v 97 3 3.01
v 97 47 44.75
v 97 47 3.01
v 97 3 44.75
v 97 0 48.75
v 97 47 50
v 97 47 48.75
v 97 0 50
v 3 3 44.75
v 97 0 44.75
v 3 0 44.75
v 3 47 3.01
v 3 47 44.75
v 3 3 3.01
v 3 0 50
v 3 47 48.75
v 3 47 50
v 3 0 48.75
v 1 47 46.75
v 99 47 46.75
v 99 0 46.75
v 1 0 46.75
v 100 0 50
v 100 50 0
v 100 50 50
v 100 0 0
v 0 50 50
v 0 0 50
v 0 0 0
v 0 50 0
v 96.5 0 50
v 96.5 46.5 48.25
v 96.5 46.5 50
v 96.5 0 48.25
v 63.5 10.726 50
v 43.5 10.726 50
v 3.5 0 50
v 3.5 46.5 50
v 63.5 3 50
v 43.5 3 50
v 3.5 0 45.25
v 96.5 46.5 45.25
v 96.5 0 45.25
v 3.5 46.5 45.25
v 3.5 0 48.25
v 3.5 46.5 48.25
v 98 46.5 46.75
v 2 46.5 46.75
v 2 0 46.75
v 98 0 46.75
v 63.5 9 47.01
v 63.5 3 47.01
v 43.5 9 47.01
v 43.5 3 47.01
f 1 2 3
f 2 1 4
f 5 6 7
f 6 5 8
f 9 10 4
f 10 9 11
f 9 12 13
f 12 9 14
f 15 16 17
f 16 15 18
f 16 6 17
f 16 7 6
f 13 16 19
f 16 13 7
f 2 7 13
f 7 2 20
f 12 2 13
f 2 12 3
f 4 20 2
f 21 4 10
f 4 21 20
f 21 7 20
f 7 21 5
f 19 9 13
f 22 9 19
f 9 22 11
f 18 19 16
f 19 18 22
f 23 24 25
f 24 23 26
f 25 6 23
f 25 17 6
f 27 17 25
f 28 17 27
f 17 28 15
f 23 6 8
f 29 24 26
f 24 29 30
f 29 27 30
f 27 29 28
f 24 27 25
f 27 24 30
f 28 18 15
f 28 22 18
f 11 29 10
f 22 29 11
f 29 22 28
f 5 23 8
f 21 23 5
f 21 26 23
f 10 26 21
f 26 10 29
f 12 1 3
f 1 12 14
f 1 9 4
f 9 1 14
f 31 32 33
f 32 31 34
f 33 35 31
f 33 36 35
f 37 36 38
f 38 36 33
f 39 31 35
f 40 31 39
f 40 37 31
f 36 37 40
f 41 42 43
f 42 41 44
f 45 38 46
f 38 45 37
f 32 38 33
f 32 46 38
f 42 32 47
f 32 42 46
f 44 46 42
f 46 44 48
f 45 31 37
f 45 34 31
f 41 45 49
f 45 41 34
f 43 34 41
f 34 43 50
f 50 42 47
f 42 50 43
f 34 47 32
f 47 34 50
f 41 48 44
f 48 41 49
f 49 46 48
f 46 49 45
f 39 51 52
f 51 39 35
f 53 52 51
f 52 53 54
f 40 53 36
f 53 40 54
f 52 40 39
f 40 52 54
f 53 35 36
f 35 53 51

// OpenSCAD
// this will be a basic box with a sliding lid
module basic_box(
    length=100,
    width=50,
    height=50,
    wall_thickness=3,
    slide_tolerance=0.5,
    print_mode=false,
) {
   module lid_body(blank_only=false) {
        lid_height = blank_only ? 
            wall_thickness+2*slide_tolerance : 
            wall_thickness;
        lid_width = blank_only ? 
            width-wall_thickness/2 : 
            width - slide_tolerance - wall_thickness;
        lid_length = blank_only ? 
            length - 2*wall_thickness : 
            length - 2*(wall_thickness + slide_tolerance);
        // lid slides in the positive y direction to close
        module lid_blank() {
            resize([
              lid_length,
              lid_width,
              blank_only ? lid_height * 2 : lid_height * 1.75 - slide_tolerance
            ])
            cube();
        }
        module triangle_thing() {
            // triangle thing is going to have a diagonal of wall_thickness, 
            // so wall thickness needs to be sqrt(2)*side_length
            side_length = lid_height / sqrt(2);
            translate([
                -lid_height/2,
                0,
                lid_height/2,
            ])
            rotate([0,45,0])
            resize([
              side_length,
              lid_width,
              side_length
            ])
            cube();
        }
        module pull_tab() {
            tab_length = length/5;
            tab_width = wall_thickness * 2;
            translate([
                length/2 - tab_length/2,
                wall_thickness,
                lid_height * 1.75 - slide_tolerance + 0.01,
            ])
            mirror([0, 0, 1])
            union() {
                resize([
                    tab_length,
                    tab_width,
                    wall_thickness,
                ])
                    cube();
                translate([
                    0,
                    tab_width,
                    wall_thickness
                ])
                    rotate([30 + 180, 0, 0])
                        resize([
                            tab_length,
                            wall_thickness,
                            wall_thickness * 1.5,
                        ])
                            cube();
            }
        }
        difference() {
            union() {
                lid_blank();
                translate([lid_length, 0, 0])
                    triangle_thing();
                triangle_thing();
                triangle_thing();
            }
            if (!blank_only)
                pull_tab();

        }
   }

    module box_body() {
       module outer_blank() resize([length, width, height]) cube();
       module inner_blank() cube([
           length - 2*wall_thickness, 
           width - 2*wall_thickness, 
           height - wall_thickness+0.01
       ]);

        difference() {
           outer_blank();
           translate([wall_thickness, wall_thickness, wall_thickness+0.01])
               inner_blank();
           translate([wall_thickness, -wall_thickness/2, height - 1.75*wall_thickness])
               lid_body(true);
       }
    }
    module translate_lid_to_slot() {
        // move up into the lid slot
        translate([
            wall_thickness + slide_tolerance, 
            0, 
            height - wall_thickness*1.75 + slide_tolerance
        ])
        children();
    }

    module translate_lid_for_print() {
        translate([0, -width * 1.5, 0])
        children();
    }
    
    box_body();
    if (print_mode)
        translate_lid_for_print()
            lid_body();
    else
        translate_lid_to_slot()
            lid_body();
}

basic_box(print_mode=false);
